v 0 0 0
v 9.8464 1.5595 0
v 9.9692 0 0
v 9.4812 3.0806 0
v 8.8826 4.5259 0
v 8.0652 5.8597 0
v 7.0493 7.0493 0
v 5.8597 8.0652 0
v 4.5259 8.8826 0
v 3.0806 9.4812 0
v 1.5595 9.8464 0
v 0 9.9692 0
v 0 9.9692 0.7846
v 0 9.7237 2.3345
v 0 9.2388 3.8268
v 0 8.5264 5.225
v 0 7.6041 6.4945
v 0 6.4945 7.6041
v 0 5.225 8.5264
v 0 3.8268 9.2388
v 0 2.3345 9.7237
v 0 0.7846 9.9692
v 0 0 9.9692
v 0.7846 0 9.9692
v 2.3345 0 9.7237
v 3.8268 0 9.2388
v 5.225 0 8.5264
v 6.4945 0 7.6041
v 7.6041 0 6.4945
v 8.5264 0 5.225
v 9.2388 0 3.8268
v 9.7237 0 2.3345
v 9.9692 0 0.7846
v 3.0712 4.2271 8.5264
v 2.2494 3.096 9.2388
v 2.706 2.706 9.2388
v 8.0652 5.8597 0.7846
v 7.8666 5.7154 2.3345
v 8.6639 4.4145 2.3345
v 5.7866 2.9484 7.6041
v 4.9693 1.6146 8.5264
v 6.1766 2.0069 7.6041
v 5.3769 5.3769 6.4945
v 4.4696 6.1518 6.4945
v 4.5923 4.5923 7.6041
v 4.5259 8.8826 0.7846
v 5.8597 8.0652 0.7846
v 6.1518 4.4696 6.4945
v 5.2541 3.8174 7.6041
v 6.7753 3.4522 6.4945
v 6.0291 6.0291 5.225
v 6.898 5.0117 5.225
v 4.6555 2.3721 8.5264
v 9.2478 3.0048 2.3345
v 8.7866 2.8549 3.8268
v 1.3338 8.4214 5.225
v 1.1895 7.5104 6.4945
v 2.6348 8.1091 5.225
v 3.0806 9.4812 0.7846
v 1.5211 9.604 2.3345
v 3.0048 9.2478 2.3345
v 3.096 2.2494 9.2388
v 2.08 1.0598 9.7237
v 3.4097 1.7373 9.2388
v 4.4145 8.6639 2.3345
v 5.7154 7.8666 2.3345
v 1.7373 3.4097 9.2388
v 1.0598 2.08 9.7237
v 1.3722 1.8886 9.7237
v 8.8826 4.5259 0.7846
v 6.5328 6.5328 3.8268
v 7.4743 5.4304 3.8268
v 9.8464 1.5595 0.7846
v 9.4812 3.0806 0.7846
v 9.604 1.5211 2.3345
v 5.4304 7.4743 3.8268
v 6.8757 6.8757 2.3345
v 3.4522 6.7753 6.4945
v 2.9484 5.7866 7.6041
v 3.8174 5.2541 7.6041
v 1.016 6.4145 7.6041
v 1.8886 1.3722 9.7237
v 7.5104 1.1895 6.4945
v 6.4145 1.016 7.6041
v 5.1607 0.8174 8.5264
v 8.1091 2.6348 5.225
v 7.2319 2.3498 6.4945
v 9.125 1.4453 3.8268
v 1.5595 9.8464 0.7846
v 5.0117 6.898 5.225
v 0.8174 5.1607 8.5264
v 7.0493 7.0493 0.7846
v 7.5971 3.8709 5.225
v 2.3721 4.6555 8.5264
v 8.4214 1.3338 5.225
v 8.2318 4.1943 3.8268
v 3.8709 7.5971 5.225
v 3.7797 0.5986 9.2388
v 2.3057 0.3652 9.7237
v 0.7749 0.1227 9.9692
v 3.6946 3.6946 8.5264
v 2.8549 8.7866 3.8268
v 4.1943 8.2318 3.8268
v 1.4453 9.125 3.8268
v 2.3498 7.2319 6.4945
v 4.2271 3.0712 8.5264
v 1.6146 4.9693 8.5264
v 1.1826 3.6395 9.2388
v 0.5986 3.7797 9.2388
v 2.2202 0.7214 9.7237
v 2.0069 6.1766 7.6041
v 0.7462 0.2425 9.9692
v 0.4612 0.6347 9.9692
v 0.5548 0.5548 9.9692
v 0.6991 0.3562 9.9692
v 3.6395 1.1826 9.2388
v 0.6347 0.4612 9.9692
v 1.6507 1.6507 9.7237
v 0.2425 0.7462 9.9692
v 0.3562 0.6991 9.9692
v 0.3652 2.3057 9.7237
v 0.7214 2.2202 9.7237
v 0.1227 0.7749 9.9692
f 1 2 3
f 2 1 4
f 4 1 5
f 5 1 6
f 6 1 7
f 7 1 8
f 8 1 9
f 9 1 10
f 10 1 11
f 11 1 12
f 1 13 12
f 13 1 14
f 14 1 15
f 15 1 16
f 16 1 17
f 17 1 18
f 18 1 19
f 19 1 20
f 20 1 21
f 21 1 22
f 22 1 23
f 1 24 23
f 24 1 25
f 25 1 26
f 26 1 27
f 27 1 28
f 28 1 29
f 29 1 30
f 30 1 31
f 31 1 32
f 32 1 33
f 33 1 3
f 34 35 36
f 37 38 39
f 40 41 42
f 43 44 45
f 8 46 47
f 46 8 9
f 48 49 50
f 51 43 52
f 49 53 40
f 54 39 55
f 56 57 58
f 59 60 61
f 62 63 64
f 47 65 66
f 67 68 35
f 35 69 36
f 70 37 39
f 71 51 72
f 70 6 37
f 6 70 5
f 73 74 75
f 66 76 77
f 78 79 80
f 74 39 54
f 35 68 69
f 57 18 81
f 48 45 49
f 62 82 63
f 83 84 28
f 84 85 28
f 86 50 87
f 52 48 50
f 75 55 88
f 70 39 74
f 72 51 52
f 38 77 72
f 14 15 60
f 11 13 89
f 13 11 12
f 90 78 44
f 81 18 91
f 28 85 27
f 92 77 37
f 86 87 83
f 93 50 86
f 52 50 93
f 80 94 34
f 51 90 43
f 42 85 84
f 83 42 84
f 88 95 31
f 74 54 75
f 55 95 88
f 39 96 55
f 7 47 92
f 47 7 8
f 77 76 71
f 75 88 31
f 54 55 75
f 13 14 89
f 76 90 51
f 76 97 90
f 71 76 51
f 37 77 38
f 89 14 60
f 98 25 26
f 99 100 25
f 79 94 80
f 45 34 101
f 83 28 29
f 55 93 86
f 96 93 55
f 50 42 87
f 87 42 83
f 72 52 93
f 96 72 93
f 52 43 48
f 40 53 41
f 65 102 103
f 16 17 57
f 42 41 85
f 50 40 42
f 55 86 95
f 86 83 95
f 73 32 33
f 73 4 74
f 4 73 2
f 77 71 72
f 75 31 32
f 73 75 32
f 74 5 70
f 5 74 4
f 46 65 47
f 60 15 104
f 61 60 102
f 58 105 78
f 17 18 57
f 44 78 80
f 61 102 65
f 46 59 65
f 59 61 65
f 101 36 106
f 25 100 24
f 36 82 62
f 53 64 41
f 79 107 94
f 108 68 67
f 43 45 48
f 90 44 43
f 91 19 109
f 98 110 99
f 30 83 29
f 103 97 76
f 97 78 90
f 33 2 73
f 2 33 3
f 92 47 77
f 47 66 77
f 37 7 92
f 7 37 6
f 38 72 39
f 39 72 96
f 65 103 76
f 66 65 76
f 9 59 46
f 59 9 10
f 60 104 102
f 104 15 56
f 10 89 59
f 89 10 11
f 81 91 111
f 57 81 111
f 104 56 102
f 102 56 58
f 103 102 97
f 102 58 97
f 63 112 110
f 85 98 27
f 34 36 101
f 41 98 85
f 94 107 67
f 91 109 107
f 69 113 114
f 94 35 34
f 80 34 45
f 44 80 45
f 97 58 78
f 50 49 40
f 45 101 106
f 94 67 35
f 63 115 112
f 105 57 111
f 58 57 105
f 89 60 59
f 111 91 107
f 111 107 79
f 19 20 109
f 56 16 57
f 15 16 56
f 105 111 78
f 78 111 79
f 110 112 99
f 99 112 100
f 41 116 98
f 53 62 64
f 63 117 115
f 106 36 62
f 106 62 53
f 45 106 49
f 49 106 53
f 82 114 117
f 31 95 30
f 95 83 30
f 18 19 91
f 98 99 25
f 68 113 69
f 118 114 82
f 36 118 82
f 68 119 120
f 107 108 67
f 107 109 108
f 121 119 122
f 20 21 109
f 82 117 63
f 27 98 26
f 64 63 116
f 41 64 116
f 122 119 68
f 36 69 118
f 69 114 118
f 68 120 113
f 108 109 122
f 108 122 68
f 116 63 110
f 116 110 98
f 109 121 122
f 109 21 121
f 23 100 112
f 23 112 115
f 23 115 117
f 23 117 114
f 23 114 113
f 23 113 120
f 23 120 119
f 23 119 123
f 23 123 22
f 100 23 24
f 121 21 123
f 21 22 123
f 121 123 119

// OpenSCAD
intersection(){
    cube(size=[20, 20, 15]);
    sphere(r=10, $fn=40);
};
